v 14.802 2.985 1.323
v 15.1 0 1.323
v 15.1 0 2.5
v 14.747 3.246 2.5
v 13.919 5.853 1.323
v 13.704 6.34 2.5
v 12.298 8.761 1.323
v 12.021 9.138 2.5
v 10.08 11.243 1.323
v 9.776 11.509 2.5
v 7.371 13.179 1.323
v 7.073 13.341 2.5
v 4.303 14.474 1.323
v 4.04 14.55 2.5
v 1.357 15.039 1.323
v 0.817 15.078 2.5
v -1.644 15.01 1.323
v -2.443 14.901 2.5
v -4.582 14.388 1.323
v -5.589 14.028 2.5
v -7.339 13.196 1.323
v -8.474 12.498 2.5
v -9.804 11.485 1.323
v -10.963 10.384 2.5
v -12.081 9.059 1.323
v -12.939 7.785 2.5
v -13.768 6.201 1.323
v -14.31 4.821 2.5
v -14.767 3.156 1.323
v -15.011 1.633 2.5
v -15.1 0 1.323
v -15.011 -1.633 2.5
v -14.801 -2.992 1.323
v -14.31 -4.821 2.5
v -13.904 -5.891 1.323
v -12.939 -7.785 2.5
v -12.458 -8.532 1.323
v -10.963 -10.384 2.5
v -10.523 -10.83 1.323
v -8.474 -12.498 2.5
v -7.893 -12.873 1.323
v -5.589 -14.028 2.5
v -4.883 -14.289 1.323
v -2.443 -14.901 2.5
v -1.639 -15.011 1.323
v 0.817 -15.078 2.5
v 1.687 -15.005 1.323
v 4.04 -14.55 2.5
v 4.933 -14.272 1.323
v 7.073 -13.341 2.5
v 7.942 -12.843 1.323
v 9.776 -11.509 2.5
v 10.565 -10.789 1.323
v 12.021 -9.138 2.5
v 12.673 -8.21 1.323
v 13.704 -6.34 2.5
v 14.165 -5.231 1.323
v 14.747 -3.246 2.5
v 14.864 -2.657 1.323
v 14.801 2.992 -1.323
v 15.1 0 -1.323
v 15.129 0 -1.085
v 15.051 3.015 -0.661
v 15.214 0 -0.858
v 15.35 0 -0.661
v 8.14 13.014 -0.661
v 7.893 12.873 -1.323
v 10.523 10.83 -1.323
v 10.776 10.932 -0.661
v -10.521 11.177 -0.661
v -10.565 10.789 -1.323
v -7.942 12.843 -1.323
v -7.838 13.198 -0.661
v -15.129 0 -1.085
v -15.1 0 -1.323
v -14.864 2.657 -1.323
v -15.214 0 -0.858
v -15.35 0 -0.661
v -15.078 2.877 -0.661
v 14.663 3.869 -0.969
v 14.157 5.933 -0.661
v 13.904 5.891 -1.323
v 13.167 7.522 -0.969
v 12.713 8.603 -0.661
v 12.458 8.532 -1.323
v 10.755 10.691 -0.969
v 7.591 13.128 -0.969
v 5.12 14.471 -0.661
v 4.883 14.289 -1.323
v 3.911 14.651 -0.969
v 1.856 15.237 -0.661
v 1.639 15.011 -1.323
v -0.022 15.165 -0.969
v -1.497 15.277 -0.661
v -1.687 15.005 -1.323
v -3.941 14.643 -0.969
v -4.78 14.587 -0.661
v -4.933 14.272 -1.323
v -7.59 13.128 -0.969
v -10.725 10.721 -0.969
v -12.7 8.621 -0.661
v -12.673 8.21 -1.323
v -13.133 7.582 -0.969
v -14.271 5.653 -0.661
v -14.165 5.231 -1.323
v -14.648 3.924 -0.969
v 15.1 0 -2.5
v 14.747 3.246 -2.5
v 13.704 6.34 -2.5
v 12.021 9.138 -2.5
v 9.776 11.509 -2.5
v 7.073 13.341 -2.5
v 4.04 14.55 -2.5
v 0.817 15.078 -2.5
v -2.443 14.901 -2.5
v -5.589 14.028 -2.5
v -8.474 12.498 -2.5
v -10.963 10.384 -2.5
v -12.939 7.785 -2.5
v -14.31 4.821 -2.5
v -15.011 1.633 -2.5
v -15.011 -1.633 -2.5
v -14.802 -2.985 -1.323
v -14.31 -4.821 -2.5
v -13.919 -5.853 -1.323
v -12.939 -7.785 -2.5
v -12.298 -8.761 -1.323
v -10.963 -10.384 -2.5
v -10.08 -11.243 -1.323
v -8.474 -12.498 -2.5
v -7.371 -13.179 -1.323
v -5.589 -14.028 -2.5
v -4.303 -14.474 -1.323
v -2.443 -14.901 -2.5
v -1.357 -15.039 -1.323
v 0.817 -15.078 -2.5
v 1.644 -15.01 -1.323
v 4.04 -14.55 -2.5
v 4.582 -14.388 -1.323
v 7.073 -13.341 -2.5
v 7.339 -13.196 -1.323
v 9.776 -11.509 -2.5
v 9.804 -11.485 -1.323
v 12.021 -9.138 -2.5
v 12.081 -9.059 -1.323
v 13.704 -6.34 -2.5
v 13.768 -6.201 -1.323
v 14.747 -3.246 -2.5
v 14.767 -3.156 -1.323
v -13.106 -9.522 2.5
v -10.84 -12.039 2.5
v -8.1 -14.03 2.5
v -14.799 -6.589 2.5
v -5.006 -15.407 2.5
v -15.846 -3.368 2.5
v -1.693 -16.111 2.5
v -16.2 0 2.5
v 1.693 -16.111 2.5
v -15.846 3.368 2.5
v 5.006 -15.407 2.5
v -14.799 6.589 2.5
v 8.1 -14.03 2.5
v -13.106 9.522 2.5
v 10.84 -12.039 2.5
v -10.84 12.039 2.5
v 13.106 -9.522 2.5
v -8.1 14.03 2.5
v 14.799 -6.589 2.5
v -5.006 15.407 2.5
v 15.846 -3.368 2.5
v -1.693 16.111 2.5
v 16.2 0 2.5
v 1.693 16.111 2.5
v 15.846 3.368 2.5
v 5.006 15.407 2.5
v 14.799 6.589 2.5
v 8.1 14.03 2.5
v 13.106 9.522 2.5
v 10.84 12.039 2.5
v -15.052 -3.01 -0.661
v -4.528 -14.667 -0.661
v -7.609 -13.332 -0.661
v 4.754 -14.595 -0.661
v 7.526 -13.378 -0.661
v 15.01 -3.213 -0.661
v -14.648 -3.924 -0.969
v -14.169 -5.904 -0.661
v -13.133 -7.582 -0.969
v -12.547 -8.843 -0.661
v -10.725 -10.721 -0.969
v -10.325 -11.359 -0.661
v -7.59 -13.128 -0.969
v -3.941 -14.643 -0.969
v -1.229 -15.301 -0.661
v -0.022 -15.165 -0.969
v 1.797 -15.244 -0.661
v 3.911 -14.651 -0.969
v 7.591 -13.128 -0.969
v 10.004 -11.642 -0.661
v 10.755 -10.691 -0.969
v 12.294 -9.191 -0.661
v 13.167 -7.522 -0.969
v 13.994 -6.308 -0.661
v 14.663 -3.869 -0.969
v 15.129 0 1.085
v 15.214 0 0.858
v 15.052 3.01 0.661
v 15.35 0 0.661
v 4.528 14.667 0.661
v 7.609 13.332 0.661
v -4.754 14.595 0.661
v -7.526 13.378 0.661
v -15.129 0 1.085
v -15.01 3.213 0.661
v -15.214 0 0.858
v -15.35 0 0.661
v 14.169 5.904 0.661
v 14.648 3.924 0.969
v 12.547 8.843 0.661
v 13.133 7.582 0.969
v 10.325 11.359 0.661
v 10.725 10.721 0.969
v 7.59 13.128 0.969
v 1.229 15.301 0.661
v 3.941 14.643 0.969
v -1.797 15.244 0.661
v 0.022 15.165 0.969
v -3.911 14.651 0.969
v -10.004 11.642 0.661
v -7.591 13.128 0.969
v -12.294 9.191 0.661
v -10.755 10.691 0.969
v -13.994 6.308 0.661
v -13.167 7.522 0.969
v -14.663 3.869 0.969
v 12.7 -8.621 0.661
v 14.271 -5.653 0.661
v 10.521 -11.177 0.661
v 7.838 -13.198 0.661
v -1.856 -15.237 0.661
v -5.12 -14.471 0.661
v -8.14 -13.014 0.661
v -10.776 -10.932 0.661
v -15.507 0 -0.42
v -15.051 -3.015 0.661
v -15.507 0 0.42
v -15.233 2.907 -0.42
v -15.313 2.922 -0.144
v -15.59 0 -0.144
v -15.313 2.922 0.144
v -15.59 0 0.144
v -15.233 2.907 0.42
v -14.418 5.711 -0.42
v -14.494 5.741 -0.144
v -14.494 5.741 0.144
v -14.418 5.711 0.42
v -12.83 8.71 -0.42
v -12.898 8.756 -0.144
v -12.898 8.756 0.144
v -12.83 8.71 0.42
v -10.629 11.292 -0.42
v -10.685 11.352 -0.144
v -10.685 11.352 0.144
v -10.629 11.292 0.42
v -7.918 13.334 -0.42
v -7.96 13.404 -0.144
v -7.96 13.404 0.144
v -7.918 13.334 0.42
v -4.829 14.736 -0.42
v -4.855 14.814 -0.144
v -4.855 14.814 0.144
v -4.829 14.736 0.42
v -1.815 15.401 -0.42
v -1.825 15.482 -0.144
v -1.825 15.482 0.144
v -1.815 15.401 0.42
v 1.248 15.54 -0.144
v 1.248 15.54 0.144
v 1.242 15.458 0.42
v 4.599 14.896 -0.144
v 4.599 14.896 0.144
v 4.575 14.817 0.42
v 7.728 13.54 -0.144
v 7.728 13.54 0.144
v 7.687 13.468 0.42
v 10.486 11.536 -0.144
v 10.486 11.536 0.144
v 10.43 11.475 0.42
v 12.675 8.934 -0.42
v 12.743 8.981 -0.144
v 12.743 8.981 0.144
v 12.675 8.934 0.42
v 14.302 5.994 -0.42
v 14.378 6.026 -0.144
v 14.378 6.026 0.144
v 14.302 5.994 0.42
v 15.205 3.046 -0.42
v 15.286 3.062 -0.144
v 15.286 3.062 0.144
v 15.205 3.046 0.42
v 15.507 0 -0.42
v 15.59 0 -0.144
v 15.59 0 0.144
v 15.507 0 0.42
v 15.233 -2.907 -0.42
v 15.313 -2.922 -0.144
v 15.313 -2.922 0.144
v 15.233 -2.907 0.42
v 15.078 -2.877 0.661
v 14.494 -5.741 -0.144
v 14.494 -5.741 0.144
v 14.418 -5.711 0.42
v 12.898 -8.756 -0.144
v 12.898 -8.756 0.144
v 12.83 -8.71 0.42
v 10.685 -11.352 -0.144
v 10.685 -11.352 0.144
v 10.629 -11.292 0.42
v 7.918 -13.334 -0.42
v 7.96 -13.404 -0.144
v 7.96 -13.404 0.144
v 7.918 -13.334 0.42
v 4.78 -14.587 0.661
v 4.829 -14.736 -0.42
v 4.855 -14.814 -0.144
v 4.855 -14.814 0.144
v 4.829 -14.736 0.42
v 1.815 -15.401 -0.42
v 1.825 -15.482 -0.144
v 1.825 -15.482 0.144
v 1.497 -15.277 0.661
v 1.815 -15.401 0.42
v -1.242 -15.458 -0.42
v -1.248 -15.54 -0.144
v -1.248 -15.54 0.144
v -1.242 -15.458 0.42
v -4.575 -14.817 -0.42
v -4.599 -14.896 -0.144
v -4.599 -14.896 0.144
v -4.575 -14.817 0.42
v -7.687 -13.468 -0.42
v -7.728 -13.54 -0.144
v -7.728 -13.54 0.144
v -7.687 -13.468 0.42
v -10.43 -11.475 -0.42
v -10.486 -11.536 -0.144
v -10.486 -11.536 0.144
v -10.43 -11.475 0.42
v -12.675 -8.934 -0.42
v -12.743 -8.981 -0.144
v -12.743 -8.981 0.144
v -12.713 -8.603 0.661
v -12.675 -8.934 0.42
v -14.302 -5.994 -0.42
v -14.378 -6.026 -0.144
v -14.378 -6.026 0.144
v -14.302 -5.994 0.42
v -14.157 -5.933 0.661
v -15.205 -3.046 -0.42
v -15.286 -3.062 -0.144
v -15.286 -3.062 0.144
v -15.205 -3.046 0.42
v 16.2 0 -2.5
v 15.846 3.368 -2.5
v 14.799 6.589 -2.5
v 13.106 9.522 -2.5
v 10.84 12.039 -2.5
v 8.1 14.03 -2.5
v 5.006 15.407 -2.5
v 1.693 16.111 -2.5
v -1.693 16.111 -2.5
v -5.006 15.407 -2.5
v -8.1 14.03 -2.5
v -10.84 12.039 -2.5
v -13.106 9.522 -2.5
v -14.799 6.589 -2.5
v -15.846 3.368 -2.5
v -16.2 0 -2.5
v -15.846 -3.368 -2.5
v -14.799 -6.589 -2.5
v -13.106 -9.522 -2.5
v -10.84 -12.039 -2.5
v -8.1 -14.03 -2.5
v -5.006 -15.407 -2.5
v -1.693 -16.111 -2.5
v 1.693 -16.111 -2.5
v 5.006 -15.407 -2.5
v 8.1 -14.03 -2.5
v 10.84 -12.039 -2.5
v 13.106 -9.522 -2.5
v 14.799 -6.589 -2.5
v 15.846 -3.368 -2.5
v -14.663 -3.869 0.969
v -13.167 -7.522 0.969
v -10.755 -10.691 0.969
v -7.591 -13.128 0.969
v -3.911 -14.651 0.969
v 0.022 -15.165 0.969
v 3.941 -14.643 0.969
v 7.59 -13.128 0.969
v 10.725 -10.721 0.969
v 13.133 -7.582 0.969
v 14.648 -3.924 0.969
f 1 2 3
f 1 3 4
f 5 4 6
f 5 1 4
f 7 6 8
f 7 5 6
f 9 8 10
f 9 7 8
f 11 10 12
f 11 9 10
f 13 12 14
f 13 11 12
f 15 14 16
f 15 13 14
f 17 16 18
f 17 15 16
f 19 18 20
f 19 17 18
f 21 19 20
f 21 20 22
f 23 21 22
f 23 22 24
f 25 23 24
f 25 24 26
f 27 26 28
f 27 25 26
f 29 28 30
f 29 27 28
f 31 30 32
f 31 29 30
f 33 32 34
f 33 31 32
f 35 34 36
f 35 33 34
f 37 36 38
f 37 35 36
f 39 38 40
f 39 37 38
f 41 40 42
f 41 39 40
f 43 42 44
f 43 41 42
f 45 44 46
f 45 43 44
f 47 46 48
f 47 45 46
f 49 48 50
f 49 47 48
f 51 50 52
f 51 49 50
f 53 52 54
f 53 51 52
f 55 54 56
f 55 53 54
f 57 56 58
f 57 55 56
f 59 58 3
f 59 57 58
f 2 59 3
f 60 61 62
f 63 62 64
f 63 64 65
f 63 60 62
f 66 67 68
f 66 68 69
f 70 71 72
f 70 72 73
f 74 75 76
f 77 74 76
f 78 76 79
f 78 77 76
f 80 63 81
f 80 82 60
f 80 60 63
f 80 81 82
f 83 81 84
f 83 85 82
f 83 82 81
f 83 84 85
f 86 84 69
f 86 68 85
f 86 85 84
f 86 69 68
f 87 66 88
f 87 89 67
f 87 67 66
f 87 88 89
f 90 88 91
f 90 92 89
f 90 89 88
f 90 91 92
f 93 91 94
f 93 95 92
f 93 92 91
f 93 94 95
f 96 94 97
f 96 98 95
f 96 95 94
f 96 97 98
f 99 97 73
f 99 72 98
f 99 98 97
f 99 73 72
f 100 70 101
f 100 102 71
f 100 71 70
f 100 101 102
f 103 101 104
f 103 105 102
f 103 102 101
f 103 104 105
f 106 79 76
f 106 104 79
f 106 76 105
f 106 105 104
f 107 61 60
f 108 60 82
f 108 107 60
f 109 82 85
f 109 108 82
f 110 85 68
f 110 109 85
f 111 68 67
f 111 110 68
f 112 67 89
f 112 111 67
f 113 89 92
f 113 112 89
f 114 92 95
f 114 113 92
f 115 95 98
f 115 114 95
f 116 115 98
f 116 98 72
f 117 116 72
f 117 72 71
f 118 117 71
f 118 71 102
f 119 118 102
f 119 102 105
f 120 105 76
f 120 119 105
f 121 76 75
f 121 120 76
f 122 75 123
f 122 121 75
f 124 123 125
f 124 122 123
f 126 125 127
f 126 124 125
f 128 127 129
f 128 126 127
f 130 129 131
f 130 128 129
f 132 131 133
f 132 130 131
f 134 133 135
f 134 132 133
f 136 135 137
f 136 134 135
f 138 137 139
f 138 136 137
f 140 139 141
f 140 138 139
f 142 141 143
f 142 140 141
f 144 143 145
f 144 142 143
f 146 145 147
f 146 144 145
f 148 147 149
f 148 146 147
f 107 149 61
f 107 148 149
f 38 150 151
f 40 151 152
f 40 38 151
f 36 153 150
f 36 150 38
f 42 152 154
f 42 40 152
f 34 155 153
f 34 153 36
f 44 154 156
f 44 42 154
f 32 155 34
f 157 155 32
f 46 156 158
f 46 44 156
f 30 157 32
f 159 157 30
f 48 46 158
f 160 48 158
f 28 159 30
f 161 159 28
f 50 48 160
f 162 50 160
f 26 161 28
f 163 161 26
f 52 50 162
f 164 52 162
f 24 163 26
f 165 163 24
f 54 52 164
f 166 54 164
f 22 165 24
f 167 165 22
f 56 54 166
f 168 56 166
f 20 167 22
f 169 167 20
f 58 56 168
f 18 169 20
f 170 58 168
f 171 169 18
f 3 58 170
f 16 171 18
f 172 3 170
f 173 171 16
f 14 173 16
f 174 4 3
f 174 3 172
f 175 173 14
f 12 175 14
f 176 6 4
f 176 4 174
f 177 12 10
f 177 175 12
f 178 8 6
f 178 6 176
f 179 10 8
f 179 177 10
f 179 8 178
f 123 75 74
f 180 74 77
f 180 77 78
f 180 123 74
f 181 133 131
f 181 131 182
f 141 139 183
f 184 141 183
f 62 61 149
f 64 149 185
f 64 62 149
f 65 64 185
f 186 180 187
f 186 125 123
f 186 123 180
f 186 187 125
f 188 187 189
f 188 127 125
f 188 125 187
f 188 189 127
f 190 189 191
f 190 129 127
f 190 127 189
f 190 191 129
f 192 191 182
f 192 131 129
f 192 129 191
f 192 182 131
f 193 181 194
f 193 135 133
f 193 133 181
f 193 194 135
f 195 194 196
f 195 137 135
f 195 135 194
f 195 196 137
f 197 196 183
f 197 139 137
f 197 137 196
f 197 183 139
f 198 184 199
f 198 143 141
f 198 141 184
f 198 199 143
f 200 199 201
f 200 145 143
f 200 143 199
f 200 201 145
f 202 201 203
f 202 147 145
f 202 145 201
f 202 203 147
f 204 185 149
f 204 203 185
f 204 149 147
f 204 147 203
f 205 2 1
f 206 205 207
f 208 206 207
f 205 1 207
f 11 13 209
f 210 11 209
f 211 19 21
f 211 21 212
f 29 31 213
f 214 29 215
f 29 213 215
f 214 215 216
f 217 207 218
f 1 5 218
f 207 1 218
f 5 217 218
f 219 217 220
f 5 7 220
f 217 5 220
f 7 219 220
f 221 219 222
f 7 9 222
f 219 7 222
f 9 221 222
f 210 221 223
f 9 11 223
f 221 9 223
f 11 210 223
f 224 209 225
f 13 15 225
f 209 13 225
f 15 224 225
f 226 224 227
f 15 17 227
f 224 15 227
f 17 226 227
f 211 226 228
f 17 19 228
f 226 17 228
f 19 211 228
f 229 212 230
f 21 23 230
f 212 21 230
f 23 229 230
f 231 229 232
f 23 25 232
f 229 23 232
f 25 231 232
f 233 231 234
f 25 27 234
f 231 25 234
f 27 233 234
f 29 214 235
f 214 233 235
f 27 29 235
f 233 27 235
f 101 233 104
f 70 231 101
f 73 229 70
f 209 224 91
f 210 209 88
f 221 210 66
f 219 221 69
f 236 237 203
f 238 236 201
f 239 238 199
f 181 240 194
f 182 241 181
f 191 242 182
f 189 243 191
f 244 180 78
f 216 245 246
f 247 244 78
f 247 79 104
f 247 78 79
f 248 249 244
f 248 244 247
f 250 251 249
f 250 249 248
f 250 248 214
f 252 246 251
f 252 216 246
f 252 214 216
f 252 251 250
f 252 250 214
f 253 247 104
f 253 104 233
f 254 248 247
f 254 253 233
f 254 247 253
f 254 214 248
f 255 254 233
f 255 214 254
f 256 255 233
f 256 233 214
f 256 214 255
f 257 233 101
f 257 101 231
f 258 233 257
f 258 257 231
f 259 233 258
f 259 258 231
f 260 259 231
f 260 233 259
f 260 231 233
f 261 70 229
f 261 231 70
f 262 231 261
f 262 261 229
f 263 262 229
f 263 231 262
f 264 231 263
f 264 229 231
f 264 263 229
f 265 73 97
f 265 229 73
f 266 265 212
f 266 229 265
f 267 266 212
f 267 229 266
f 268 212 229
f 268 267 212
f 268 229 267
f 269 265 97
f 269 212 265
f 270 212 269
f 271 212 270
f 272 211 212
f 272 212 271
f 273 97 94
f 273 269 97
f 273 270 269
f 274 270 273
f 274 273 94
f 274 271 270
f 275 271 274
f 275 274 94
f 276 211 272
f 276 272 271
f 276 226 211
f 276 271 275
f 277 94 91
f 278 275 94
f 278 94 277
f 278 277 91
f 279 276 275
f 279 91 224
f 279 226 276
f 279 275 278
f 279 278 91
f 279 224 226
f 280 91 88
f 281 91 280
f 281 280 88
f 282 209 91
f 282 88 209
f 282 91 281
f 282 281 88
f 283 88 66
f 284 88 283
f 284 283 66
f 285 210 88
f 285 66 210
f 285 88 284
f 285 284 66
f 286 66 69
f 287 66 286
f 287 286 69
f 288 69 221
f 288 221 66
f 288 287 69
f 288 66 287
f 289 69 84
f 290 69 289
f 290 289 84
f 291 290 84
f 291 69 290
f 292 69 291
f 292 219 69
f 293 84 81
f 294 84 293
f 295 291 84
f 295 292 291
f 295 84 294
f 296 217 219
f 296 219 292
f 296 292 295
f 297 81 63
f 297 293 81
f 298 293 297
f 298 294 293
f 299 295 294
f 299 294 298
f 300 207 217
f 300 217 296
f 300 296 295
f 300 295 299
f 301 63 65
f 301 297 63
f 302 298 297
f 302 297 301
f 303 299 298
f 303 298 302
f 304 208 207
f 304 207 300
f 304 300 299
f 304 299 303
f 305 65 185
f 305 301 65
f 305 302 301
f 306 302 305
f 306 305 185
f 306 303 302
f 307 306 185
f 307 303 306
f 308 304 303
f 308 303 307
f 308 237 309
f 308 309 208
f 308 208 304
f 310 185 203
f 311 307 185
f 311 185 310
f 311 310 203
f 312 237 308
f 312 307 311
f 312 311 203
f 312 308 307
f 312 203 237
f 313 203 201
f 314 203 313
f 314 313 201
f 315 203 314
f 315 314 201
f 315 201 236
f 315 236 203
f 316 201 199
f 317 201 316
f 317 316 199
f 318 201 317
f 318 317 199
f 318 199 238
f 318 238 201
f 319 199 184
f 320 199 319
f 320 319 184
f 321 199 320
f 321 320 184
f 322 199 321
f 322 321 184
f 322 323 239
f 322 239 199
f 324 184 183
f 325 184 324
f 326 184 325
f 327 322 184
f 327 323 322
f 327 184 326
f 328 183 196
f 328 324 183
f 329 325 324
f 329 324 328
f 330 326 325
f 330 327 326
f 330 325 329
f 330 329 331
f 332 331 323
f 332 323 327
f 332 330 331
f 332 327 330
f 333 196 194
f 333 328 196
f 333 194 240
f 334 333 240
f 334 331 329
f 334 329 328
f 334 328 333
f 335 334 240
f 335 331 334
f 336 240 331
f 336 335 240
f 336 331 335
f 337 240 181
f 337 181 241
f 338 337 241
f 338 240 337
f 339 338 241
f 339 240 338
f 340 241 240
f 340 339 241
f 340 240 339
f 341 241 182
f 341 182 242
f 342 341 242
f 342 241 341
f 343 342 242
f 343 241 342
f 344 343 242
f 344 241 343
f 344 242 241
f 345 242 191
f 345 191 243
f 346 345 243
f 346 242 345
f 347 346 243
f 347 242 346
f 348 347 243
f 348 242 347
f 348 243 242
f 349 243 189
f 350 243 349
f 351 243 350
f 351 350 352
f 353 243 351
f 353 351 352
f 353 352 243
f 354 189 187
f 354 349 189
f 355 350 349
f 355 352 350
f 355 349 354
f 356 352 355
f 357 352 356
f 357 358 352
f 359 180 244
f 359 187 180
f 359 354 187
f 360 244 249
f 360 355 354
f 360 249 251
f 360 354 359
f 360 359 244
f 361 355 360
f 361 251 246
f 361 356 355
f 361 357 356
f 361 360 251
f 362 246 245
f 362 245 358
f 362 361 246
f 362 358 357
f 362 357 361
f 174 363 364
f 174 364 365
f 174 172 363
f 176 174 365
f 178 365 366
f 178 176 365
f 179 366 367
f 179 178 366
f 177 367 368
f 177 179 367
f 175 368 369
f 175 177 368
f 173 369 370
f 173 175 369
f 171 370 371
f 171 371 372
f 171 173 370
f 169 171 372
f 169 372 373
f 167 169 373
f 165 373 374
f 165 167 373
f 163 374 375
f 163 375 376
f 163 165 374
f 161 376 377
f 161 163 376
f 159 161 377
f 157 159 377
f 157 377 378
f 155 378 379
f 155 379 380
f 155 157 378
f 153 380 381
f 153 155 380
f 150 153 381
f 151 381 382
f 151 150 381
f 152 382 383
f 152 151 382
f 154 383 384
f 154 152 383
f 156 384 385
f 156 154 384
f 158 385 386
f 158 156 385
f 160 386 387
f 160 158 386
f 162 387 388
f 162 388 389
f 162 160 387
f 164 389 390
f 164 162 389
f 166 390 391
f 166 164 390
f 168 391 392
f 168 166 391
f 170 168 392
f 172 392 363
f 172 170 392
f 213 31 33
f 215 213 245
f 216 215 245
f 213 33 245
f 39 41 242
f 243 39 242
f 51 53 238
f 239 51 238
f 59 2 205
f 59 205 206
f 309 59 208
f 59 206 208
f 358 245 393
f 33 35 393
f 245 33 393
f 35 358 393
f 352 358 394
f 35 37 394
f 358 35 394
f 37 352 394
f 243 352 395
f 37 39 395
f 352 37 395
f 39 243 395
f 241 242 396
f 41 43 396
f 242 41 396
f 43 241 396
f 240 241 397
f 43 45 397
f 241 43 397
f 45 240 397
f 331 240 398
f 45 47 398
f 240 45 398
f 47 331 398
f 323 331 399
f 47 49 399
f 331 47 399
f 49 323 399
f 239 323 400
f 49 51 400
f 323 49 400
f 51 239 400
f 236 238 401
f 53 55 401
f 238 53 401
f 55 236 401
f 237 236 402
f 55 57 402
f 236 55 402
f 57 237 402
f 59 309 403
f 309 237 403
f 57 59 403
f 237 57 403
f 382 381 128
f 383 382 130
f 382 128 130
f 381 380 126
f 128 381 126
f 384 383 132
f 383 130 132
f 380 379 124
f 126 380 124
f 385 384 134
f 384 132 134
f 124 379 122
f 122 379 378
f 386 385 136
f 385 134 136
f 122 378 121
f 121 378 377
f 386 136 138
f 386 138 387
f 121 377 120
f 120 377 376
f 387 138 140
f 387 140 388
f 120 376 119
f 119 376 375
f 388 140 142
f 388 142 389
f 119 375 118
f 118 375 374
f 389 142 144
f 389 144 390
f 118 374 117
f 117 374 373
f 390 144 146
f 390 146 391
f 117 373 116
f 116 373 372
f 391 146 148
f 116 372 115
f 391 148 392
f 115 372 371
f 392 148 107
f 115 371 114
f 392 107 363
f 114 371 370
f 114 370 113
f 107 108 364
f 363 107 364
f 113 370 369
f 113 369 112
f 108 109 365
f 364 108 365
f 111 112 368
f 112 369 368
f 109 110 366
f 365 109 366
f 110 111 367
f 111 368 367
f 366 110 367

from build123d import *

# Parameters (mm, degrees)
SKETCH_1_R      = 16.2
SKETCH_1_R_2    = 15.1
EXTRUDE_1_DEPTH = 2.5
SKETCH_3_R      = 1
FILLET_1_R      = 1


with BuildPart() as part:
    # 草图1 → 凸台-拉伸1 (new body, symmetric)
    with BuildSketch(Plane.XY):
        Circle(SKETCH_1_R)
        Circle(SKETCH_1_R_2, mode=Mode.SUBTRACT)
    extrude(amount=EXTRUDE_1_DEPTH, both=True)

    # 草图3 → 切除-旋转1 (revolve, cut)
    with BuildSketch(Plane(origin=(0, 0, 0), x_dir=(1, 0, 0), z_dir=(0, 1, 0))):
        with Locations((-14.6, 0)):
            Circle(SKETCH_3_R)
    revolve(axis=Axis((0, 0, 2.5), (0, 0, -1)), mode=Mode.SUBTRACT)

    # 圆角1
    fillet_1_edges = [part.edges().sort_by_distance(p)[0] for p in [
        (0, 15.1, 0.866025404),
        (0, -15.1, -0.866025404),
    ]]
    fillet(fillet_1_edges, radius=FILLET_1_R)


solid = part.part
